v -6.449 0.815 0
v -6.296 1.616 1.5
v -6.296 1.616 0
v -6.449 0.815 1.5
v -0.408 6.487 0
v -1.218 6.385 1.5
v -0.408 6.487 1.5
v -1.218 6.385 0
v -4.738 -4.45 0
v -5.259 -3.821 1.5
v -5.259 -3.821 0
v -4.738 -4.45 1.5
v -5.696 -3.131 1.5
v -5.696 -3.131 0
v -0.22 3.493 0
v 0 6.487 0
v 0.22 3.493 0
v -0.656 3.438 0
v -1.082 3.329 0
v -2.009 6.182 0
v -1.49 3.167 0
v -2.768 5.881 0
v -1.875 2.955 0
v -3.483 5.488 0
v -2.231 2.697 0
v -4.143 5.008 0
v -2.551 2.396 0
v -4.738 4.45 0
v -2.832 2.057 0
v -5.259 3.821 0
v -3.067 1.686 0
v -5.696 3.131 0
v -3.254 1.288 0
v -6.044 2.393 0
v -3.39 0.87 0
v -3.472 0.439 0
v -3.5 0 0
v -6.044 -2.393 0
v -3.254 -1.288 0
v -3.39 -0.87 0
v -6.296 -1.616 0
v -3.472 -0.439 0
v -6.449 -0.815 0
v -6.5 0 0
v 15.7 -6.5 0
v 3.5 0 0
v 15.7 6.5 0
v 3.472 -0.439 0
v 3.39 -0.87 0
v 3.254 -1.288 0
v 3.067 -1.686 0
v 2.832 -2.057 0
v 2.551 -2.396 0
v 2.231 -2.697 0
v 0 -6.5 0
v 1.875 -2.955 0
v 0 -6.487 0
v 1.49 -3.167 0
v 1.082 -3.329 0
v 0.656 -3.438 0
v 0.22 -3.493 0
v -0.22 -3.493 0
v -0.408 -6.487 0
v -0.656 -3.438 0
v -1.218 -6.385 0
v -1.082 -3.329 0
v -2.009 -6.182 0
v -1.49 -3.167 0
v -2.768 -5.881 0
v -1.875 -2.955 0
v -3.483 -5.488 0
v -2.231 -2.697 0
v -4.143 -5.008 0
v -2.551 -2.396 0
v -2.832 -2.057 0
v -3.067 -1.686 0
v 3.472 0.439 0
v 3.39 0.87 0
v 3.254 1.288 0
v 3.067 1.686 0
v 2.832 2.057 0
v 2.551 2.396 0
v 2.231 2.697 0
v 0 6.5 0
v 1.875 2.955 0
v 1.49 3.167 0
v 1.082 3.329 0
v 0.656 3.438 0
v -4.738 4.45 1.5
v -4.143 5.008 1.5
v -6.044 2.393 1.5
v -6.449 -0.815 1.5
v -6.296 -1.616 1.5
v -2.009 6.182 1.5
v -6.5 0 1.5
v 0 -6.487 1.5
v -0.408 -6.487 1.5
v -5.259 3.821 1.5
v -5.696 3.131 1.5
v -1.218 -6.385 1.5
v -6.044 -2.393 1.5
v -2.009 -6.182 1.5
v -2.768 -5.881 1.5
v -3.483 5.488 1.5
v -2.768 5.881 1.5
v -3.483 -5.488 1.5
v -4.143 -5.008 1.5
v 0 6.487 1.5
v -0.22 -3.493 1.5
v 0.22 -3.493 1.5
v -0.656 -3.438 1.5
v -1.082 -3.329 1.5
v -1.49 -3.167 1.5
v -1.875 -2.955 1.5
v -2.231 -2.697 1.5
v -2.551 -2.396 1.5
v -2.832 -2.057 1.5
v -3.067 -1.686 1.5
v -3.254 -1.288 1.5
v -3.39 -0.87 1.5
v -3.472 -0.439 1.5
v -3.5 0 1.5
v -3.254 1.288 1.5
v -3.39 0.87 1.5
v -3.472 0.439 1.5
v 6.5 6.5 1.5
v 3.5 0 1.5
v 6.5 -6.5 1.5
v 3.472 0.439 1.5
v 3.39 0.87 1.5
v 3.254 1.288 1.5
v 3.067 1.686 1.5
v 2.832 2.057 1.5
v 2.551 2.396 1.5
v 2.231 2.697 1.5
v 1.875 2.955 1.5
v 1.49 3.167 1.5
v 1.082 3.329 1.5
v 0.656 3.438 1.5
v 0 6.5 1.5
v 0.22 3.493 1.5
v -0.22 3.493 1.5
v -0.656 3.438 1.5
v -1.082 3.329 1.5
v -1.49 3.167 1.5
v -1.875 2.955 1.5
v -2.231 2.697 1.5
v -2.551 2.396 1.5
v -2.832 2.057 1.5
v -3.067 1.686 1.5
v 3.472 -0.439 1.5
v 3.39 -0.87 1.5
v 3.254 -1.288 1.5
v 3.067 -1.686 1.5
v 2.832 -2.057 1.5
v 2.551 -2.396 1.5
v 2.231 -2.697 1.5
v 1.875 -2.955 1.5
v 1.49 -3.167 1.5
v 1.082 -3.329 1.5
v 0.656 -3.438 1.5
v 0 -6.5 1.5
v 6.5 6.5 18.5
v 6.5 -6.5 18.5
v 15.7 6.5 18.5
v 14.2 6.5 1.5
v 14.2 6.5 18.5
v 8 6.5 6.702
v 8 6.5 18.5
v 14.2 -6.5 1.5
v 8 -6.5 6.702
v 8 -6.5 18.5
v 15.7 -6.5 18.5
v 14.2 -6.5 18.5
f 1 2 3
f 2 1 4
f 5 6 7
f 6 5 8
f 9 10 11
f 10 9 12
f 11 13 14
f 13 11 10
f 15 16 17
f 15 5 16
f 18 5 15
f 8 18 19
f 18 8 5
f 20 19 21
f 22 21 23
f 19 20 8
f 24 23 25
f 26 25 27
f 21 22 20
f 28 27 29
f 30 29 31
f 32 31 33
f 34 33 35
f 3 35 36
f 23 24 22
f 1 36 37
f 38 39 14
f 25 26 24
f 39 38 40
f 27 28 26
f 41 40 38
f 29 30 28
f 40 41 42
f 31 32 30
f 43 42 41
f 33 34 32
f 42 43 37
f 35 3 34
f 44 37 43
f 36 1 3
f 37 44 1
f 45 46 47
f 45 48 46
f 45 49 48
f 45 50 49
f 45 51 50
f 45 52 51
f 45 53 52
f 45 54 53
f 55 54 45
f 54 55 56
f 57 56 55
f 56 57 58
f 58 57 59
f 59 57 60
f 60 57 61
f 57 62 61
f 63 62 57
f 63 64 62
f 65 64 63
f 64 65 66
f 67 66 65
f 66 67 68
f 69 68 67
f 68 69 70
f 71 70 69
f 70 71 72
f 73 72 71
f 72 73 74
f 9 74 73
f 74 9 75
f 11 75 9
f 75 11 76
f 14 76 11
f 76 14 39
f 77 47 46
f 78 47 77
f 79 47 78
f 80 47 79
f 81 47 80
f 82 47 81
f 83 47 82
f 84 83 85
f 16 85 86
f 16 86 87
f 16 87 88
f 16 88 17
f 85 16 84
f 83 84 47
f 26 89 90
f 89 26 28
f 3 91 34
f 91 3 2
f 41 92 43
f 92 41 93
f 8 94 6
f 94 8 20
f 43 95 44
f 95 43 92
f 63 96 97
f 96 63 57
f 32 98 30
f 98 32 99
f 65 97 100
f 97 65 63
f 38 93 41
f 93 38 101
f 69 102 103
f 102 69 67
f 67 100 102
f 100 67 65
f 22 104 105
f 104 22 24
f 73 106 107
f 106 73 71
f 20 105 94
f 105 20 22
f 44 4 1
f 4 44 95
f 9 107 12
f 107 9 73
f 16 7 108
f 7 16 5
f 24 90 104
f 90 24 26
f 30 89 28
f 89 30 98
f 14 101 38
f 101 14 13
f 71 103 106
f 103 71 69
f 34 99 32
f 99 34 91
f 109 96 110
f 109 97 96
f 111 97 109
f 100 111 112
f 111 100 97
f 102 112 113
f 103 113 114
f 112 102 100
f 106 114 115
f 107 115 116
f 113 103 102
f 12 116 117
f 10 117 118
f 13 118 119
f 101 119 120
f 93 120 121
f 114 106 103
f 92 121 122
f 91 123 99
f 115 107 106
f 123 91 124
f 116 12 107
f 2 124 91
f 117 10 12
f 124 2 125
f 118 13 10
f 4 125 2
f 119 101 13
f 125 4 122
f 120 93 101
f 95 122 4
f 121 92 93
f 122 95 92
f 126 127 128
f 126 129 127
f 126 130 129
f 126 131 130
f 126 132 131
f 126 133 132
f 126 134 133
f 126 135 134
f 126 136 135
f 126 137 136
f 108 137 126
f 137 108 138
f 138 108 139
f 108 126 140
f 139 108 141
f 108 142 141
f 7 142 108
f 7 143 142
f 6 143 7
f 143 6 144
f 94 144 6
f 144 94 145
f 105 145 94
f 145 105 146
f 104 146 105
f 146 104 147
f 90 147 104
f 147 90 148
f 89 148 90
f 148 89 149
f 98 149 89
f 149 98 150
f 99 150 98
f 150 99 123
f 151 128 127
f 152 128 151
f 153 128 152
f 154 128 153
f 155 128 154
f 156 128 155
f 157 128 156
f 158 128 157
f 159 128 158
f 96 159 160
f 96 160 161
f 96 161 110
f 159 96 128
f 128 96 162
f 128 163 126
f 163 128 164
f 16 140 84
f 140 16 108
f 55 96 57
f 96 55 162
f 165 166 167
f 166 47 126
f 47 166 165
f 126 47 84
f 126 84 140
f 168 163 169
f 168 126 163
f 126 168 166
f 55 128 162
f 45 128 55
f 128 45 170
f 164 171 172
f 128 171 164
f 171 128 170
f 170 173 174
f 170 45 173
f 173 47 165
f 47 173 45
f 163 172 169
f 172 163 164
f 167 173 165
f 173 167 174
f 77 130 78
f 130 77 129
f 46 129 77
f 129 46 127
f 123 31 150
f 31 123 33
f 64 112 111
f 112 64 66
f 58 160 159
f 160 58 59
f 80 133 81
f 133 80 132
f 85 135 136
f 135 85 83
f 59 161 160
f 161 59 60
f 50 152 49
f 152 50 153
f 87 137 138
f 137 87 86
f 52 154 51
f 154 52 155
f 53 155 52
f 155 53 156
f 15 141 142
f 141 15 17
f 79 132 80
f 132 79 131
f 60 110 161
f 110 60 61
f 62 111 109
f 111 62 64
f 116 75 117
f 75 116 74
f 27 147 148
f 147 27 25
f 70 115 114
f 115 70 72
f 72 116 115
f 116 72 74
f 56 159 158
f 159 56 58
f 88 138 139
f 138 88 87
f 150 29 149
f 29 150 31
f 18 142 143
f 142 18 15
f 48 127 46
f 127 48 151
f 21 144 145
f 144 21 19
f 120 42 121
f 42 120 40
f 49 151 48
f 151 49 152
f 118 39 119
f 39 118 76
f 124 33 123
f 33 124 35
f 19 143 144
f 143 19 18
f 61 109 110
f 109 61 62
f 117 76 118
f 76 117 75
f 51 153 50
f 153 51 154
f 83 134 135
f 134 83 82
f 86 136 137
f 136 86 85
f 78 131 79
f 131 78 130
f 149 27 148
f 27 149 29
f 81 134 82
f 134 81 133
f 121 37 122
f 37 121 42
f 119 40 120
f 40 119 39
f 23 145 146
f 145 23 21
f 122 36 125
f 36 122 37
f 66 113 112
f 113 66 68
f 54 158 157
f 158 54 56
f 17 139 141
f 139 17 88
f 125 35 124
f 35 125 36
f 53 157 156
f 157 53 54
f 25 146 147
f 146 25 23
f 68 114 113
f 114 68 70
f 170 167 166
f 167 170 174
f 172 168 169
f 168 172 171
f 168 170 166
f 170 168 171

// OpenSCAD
$fn = 50;

wall = 1.5;

mount_hole_diameter = 7;
holder_diameter = 13;
laptop_thickness = 6.2;
clip_height = 17; // this is just a bit smaller than the top bezel

laptop_back_bezel_angle = 50; // I just measured roughly 50 degrees from a picture

difference() {
	union(){
		cylinder(h = wall, d = holder_diameter);
		
		translate([0, -holder_diameter/2, 0])
		cube([holder_diameter/2, holder_diameter, wall]);

		translate([holder_diameter/2, -holder_diameter/2, 0])
		cube([laptop_thickness + (wall*2), holder_diameter, wall + clip_height]);
		
	};
	cylinder(h = 100, d =  mount_hole_diameter, center = true);
	
	translate([(holder_diameter/2) + wall, -50, wall])
	cube([laptop_thickness, 100, 100]);
};

translate([(holder_diameter/2) + wall, holder_diameter/2, wall])
rotate([90, 0, 0])
linear_extrude(holder_diameter)
polygon([[0, 0], [laptop_thickness, 0], [0, tan(90 - laptop_back_bezel_angle) * laptop_thickness]]);
